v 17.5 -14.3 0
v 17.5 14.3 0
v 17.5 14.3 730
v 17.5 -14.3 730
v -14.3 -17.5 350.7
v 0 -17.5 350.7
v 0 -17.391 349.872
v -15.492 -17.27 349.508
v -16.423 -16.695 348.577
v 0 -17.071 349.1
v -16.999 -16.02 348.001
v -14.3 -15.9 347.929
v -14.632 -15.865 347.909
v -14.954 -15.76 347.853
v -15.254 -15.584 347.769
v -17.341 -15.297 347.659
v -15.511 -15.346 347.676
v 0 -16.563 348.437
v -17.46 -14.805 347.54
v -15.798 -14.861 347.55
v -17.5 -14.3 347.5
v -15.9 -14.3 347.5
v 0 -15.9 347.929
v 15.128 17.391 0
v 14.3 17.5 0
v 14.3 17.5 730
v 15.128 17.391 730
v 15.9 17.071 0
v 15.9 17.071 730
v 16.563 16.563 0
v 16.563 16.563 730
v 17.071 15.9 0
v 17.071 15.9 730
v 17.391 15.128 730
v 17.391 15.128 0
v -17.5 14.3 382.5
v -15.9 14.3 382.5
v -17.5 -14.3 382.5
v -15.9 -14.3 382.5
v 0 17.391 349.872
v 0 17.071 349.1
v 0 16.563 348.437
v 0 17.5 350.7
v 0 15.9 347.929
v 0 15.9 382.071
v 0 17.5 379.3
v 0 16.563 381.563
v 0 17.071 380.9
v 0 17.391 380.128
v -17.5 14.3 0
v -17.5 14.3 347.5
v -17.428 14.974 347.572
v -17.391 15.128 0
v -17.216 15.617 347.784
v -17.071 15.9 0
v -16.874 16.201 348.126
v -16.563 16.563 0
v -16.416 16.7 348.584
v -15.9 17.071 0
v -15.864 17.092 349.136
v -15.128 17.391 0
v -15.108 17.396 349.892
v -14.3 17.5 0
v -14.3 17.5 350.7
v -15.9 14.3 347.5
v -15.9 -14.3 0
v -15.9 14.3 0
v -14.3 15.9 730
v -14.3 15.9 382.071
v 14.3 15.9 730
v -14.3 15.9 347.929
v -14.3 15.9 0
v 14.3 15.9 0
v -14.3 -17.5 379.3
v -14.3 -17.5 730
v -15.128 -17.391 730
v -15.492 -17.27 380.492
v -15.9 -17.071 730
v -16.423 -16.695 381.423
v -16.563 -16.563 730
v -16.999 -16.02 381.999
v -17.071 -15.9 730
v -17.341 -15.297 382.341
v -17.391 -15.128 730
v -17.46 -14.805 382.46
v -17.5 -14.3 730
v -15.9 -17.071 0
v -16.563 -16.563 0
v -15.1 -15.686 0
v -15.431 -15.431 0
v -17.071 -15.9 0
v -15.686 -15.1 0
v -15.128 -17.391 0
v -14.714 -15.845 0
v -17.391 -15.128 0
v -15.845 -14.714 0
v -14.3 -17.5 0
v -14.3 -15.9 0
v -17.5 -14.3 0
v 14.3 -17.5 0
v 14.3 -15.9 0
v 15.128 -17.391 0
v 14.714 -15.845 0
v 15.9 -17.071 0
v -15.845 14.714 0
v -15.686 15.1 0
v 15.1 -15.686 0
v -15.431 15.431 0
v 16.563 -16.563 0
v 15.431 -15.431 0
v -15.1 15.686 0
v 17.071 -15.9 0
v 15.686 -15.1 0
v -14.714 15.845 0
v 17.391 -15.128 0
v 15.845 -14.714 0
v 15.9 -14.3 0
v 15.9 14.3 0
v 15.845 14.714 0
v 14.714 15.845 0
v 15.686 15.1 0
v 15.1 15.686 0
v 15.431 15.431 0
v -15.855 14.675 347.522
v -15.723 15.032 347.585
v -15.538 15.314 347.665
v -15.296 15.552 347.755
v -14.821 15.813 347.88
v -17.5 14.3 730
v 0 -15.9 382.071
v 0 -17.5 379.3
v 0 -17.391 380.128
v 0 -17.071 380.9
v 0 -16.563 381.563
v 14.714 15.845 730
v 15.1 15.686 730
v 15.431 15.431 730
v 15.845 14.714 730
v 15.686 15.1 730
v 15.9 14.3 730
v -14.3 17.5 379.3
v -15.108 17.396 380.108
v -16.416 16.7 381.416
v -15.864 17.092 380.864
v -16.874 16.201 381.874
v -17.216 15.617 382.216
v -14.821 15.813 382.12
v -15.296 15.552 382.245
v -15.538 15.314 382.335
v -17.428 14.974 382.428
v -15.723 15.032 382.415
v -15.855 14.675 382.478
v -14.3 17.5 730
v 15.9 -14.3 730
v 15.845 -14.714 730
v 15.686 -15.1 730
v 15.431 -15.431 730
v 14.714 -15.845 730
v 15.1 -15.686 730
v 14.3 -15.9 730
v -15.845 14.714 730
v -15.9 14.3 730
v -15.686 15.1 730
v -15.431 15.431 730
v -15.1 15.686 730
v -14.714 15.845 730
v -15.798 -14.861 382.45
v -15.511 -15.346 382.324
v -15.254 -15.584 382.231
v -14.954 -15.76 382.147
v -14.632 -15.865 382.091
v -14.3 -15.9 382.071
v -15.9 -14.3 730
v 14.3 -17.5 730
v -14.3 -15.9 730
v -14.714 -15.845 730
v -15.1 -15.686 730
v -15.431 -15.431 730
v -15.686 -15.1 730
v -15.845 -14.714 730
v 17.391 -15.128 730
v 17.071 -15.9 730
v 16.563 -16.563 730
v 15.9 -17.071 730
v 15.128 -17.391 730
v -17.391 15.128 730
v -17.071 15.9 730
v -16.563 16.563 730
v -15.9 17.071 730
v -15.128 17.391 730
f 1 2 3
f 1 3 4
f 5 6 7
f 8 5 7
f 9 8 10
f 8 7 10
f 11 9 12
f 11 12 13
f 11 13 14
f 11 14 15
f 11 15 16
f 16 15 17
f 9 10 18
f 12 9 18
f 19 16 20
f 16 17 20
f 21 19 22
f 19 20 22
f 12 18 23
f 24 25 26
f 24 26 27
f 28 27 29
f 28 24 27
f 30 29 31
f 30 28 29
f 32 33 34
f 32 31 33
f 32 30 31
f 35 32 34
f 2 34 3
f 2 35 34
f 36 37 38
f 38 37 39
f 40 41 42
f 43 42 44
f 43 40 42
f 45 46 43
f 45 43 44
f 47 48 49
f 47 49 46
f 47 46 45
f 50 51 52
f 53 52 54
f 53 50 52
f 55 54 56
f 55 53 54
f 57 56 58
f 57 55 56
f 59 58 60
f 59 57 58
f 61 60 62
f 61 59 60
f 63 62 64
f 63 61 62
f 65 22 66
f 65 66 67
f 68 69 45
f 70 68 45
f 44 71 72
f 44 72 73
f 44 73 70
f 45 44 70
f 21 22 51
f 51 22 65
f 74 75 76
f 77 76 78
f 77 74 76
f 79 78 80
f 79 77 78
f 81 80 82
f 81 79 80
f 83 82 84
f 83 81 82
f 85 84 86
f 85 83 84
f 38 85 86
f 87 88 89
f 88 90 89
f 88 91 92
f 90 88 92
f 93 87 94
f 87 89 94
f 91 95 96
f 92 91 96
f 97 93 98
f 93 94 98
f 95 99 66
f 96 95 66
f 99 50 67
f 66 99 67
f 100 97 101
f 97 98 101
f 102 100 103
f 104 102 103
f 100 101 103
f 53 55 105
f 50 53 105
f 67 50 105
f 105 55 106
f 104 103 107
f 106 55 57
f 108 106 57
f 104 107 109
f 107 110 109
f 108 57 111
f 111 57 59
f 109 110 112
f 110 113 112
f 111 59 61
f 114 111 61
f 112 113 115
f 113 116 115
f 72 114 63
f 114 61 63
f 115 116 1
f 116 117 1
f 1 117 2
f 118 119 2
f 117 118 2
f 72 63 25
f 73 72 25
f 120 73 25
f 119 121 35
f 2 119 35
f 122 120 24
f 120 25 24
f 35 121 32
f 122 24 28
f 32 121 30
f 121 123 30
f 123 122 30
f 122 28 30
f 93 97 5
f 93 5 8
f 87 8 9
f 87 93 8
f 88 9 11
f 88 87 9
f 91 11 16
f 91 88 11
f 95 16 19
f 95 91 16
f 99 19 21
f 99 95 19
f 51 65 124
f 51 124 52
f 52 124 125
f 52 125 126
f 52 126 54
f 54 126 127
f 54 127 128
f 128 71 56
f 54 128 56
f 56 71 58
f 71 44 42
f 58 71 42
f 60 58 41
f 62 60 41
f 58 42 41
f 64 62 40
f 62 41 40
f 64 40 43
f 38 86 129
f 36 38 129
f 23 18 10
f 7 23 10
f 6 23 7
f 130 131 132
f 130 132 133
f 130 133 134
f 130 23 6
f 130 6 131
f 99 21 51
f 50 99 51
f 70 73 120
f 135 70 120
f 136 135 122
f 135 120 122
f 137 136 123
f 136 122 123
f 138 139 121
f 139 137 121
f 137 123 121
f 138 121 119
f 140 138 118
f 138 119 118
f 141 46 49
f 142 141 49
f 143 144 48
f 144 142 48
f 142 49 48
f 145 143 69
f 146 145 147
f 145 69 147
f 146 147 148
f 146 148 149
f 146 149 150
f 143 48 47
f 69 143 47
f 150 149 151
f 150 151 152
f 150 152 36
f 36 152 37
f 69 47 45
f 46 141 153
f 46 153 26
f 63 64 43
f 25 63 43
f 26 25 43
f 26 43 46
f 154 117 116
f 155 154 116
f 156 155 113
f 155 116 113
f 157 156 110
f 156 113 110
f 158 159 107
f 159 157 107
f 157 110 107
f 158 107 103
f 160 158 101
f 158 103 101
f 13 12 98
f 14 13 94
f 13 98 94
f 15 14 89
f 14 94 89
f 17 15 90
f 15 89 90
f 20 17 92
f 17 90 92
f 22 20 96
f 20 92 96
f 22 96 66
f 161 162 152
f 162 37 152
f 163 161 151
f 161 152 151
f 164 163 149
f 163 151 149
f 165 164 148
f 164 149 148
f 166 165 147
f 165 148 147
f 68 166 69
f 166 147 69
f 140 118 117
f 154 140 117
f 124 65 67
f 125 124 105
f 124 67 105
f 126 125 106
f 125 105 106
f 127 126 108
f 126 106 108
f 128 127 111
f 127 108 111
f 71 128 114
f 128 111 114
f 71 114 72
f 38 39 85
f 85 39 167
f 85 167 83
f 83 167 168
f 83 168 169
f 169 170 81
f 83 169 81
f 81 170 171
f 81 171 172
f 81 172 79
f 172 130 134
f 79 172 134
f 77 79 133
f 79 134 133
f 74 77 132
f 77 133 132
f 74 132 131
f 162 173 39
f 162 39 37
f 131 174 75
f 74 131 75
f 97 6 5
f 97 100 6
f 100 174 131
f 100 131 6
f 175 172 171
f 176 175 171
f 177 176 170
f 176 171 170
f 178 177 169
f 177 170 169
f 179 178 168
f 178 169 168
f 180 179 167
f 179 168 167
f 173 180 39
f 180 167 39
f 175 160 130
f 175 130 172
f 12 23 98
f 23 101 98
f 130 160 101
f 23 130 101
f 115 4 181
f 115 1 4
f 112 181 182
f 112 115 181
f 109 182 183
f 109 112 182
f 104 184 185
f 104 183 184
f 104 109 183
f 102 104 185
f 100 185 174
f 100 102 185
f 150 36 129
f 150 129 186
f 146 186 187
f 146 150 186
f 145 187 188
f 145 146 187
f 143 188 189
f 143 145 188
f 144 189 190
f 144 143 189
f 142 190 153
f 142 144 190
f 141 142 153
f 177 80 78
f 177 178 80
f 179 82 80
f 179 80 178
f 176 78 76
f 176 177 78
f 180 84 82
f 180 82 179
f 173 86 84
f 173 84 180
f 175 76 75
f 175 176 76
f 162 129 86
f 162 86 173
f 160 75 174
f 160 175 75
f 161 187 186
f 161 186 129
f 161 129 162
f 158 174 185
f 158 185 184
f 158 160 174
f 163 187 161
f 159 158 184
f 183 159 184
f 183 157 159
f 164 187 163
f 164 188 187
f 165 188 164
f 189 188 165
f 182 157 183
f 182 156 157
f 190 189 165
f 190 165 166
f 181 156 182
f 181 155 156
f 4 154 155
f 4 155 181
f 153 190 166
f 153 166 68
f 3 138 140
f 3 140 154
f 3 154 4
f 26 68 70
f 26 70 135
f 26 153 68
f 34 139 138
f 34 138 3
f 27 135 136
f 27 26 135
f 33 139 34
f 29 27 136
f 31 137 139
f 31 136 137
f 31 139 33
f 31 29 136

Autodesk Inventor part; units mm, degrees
ref_plane "Start plane" through (0, 0, 0) normal (0, 0, 1) x (1, 0, 0)
ref_plane "End plane" through (0, 0, 730) normal (0, 0, 1) x (1, 0, 0)
sketch "Sketch" plane through (0, 0, 0) normal (0, 0, 1) x (1, 0, 0)
  line L0 (-17.5, -14.3) -> (-17.5, 14.3)
  line L1 (-14.3, 17.5) -> (14.3, 17.5)
  line L2 (17.5, 14.3) -> (17.5, -14.3)
  line L3 (14.3, -17.5) -> (-14.3, -17.5)
  arc A0 (-17.5, -14.3) -> (-14.3, -17.5) centre (-14.3, -14.3) ccw
  arc A1 (-14.3, 17.5) -> (-17.5, 14.3) centre (-14.3, 14.3) ccw
  arc A2 (17.5, 14.3) -> (14.3, 17.5) centre (14.3, 14.3) ccw
  arc A3 (14.3, -17.5) -> (17.5, -14.3) centre (14.3, -14.3) ccw
  arc A4 (-14.3, 15.9) -> (-15.9, 14.3) centre (-14.3, 14.3) ccw
  line L4 (-14.3, 15.9) -> (14.3, 15.9)
  arc A5 (15.9, 14.3) -> (14.3, 15.9) centre (14.3, 14.3) ccw
  line L5 (15.9, 14.3) -> (15.9, -14.3)
  arc A6 (14.3, -15.9) -> (15.9, -14.3) centre (14.3, -14.3) ccw
  line L6 (14.3, -15.9) -> (-14.3, -15.9)
  arc A7 (-15.9, -14.3) -> (-14.3, -15.9) centre (-14.3, -14.3) ccw
  line L7 (-15.9, -14.3) -> (-15.9, 14.3)
  line L8 (0, 25.4278) -> (0, -25.4278) construction
  line L9 (-25.4278, 0) -> (25.4278, 0) construction
  dimension "d7" = 3.2
  dimension "d10" = 35
  dimension "d11" = 35
  dimension "d12" = 1.6
  dimension "d15" = 17.5
  dimension "d16" = 17.5
extrude "Body" add sketch "Sketch" along normal up to surface (730 mm away) from surface at 0
sketch "Sketch3" plane through (0, 0, 0) normal (0, 0, 1) x (1, 0, 0)
  line L0 (0, 0) -> (10, 0)
ref_plane "Work Plane3" through (0, 0, 0) normal (0, -1, 0) x (1, 0, 0)
sketch "Sketch4" plane through (0, 0, 0) normal (0, -1, 0) x (1, 0, 0)
  line L0 (-2, 0) -> (12, 0)
  line L1 (-2, 730) -> (12, 730)
  dimension "d18" = 730
ref_plane "Work Plane4" through (0, 0, 365) normal (-1, 0, 0) x (0, 0, 1)
ref_plane "Work Plane5" through (-430, 0, 365) normal (-1, 0, 0) x (0, 0, 1)
ref_plane "Work Plane6" through (-215, 0, 365) normal (-1, 0, 0) x (0, 0, 1)
sketch "Sketch5" plane through (-215, 0, 365) normal (-1, 0, 0) x (0, 0, 1)
  arc A0 (-17.5, -14.3) -> (-14.3, -17.5) centre (-14.3, -14.3) ccw
  line L0 (-17.5, -14.3) -> (-17.5, 14.3)
  arc A1 (-14.3, 17.5) -> (-17.5, 14.3) centre (-14.3, 14.3) ccw
  line L1 (-14.3, 17.5) -> (14.3, 17.5)
  arc A2 (17.5, 14.3) -> (14.3, 17.5) centre (14.3, 14.3) ccw
  line L2 (17.5, 14.3) -> (17.5, -14.3)
  arc A3 (14.3, -17.5) -> (17.5, -14.3) centre (14.3, -14.3) ccw
  line L3 (14.3, -17.5) -> (-14.3, -17.5)
  arc A4 (-14.3, 15.9) -> (-15.9, 14.3) centre (-14.3, 14.3) ccw
  line L4 (-14.3, 15.9) -> (14.3, 15.9)
  arc A5 (15.9, 14.3) -> (14.3, 15.9) centre (14.3, 14.3) ccw
  line L5 (15.9, 14.3) -> (15.9, -14.3)
  arc A6 (14.3, -15.9) -> (15.9, -14.3) centre (14.3, -14.3) ccw
  line L6 (14.3, -15.9) -> (-14.3, -15.9)
  arc A7 (-15.9, -14.3) -> (-14.3, -15.9) centre (-14.3, -14.3) ccw
  line L7 (-15.9, -14.3) -> (-15.9, 14.3)
extrude "Extrusion2" cut sketch "Sketch5" along normal up to surface (430 mm away) from surface at -215 contours L0 A1 L1 A2 L2 A3 L3 A0 | L4 A5 L5 A6 L6 A7 L7 A4
equation "\"d7\" = G_IR"
equation "\"d10\" = G_H"
equation "\"d11\" = G_W"
equation "\"d12\" = G_T"
equation "\"d15\" = 0.5 * d10"
equation "\"d16\" = 0.5 * d11"
equation "\"d3\" = G_L"
equation "\"G_W\" = 35"
equation "\"G_H\" = 35"
equation "\"G_T\" = 1.6"
equation "\"G_IR\" = 3.2"
equation "\"G_L\" = d18"
equation "\"G_OFFSET_START\" = 0"
equation "\"G_OFFSET_END\" = 0"
properties part number "AS 1163 - C350L0 35x35x1.6 SHS - 730" material "Steel, Mild"
